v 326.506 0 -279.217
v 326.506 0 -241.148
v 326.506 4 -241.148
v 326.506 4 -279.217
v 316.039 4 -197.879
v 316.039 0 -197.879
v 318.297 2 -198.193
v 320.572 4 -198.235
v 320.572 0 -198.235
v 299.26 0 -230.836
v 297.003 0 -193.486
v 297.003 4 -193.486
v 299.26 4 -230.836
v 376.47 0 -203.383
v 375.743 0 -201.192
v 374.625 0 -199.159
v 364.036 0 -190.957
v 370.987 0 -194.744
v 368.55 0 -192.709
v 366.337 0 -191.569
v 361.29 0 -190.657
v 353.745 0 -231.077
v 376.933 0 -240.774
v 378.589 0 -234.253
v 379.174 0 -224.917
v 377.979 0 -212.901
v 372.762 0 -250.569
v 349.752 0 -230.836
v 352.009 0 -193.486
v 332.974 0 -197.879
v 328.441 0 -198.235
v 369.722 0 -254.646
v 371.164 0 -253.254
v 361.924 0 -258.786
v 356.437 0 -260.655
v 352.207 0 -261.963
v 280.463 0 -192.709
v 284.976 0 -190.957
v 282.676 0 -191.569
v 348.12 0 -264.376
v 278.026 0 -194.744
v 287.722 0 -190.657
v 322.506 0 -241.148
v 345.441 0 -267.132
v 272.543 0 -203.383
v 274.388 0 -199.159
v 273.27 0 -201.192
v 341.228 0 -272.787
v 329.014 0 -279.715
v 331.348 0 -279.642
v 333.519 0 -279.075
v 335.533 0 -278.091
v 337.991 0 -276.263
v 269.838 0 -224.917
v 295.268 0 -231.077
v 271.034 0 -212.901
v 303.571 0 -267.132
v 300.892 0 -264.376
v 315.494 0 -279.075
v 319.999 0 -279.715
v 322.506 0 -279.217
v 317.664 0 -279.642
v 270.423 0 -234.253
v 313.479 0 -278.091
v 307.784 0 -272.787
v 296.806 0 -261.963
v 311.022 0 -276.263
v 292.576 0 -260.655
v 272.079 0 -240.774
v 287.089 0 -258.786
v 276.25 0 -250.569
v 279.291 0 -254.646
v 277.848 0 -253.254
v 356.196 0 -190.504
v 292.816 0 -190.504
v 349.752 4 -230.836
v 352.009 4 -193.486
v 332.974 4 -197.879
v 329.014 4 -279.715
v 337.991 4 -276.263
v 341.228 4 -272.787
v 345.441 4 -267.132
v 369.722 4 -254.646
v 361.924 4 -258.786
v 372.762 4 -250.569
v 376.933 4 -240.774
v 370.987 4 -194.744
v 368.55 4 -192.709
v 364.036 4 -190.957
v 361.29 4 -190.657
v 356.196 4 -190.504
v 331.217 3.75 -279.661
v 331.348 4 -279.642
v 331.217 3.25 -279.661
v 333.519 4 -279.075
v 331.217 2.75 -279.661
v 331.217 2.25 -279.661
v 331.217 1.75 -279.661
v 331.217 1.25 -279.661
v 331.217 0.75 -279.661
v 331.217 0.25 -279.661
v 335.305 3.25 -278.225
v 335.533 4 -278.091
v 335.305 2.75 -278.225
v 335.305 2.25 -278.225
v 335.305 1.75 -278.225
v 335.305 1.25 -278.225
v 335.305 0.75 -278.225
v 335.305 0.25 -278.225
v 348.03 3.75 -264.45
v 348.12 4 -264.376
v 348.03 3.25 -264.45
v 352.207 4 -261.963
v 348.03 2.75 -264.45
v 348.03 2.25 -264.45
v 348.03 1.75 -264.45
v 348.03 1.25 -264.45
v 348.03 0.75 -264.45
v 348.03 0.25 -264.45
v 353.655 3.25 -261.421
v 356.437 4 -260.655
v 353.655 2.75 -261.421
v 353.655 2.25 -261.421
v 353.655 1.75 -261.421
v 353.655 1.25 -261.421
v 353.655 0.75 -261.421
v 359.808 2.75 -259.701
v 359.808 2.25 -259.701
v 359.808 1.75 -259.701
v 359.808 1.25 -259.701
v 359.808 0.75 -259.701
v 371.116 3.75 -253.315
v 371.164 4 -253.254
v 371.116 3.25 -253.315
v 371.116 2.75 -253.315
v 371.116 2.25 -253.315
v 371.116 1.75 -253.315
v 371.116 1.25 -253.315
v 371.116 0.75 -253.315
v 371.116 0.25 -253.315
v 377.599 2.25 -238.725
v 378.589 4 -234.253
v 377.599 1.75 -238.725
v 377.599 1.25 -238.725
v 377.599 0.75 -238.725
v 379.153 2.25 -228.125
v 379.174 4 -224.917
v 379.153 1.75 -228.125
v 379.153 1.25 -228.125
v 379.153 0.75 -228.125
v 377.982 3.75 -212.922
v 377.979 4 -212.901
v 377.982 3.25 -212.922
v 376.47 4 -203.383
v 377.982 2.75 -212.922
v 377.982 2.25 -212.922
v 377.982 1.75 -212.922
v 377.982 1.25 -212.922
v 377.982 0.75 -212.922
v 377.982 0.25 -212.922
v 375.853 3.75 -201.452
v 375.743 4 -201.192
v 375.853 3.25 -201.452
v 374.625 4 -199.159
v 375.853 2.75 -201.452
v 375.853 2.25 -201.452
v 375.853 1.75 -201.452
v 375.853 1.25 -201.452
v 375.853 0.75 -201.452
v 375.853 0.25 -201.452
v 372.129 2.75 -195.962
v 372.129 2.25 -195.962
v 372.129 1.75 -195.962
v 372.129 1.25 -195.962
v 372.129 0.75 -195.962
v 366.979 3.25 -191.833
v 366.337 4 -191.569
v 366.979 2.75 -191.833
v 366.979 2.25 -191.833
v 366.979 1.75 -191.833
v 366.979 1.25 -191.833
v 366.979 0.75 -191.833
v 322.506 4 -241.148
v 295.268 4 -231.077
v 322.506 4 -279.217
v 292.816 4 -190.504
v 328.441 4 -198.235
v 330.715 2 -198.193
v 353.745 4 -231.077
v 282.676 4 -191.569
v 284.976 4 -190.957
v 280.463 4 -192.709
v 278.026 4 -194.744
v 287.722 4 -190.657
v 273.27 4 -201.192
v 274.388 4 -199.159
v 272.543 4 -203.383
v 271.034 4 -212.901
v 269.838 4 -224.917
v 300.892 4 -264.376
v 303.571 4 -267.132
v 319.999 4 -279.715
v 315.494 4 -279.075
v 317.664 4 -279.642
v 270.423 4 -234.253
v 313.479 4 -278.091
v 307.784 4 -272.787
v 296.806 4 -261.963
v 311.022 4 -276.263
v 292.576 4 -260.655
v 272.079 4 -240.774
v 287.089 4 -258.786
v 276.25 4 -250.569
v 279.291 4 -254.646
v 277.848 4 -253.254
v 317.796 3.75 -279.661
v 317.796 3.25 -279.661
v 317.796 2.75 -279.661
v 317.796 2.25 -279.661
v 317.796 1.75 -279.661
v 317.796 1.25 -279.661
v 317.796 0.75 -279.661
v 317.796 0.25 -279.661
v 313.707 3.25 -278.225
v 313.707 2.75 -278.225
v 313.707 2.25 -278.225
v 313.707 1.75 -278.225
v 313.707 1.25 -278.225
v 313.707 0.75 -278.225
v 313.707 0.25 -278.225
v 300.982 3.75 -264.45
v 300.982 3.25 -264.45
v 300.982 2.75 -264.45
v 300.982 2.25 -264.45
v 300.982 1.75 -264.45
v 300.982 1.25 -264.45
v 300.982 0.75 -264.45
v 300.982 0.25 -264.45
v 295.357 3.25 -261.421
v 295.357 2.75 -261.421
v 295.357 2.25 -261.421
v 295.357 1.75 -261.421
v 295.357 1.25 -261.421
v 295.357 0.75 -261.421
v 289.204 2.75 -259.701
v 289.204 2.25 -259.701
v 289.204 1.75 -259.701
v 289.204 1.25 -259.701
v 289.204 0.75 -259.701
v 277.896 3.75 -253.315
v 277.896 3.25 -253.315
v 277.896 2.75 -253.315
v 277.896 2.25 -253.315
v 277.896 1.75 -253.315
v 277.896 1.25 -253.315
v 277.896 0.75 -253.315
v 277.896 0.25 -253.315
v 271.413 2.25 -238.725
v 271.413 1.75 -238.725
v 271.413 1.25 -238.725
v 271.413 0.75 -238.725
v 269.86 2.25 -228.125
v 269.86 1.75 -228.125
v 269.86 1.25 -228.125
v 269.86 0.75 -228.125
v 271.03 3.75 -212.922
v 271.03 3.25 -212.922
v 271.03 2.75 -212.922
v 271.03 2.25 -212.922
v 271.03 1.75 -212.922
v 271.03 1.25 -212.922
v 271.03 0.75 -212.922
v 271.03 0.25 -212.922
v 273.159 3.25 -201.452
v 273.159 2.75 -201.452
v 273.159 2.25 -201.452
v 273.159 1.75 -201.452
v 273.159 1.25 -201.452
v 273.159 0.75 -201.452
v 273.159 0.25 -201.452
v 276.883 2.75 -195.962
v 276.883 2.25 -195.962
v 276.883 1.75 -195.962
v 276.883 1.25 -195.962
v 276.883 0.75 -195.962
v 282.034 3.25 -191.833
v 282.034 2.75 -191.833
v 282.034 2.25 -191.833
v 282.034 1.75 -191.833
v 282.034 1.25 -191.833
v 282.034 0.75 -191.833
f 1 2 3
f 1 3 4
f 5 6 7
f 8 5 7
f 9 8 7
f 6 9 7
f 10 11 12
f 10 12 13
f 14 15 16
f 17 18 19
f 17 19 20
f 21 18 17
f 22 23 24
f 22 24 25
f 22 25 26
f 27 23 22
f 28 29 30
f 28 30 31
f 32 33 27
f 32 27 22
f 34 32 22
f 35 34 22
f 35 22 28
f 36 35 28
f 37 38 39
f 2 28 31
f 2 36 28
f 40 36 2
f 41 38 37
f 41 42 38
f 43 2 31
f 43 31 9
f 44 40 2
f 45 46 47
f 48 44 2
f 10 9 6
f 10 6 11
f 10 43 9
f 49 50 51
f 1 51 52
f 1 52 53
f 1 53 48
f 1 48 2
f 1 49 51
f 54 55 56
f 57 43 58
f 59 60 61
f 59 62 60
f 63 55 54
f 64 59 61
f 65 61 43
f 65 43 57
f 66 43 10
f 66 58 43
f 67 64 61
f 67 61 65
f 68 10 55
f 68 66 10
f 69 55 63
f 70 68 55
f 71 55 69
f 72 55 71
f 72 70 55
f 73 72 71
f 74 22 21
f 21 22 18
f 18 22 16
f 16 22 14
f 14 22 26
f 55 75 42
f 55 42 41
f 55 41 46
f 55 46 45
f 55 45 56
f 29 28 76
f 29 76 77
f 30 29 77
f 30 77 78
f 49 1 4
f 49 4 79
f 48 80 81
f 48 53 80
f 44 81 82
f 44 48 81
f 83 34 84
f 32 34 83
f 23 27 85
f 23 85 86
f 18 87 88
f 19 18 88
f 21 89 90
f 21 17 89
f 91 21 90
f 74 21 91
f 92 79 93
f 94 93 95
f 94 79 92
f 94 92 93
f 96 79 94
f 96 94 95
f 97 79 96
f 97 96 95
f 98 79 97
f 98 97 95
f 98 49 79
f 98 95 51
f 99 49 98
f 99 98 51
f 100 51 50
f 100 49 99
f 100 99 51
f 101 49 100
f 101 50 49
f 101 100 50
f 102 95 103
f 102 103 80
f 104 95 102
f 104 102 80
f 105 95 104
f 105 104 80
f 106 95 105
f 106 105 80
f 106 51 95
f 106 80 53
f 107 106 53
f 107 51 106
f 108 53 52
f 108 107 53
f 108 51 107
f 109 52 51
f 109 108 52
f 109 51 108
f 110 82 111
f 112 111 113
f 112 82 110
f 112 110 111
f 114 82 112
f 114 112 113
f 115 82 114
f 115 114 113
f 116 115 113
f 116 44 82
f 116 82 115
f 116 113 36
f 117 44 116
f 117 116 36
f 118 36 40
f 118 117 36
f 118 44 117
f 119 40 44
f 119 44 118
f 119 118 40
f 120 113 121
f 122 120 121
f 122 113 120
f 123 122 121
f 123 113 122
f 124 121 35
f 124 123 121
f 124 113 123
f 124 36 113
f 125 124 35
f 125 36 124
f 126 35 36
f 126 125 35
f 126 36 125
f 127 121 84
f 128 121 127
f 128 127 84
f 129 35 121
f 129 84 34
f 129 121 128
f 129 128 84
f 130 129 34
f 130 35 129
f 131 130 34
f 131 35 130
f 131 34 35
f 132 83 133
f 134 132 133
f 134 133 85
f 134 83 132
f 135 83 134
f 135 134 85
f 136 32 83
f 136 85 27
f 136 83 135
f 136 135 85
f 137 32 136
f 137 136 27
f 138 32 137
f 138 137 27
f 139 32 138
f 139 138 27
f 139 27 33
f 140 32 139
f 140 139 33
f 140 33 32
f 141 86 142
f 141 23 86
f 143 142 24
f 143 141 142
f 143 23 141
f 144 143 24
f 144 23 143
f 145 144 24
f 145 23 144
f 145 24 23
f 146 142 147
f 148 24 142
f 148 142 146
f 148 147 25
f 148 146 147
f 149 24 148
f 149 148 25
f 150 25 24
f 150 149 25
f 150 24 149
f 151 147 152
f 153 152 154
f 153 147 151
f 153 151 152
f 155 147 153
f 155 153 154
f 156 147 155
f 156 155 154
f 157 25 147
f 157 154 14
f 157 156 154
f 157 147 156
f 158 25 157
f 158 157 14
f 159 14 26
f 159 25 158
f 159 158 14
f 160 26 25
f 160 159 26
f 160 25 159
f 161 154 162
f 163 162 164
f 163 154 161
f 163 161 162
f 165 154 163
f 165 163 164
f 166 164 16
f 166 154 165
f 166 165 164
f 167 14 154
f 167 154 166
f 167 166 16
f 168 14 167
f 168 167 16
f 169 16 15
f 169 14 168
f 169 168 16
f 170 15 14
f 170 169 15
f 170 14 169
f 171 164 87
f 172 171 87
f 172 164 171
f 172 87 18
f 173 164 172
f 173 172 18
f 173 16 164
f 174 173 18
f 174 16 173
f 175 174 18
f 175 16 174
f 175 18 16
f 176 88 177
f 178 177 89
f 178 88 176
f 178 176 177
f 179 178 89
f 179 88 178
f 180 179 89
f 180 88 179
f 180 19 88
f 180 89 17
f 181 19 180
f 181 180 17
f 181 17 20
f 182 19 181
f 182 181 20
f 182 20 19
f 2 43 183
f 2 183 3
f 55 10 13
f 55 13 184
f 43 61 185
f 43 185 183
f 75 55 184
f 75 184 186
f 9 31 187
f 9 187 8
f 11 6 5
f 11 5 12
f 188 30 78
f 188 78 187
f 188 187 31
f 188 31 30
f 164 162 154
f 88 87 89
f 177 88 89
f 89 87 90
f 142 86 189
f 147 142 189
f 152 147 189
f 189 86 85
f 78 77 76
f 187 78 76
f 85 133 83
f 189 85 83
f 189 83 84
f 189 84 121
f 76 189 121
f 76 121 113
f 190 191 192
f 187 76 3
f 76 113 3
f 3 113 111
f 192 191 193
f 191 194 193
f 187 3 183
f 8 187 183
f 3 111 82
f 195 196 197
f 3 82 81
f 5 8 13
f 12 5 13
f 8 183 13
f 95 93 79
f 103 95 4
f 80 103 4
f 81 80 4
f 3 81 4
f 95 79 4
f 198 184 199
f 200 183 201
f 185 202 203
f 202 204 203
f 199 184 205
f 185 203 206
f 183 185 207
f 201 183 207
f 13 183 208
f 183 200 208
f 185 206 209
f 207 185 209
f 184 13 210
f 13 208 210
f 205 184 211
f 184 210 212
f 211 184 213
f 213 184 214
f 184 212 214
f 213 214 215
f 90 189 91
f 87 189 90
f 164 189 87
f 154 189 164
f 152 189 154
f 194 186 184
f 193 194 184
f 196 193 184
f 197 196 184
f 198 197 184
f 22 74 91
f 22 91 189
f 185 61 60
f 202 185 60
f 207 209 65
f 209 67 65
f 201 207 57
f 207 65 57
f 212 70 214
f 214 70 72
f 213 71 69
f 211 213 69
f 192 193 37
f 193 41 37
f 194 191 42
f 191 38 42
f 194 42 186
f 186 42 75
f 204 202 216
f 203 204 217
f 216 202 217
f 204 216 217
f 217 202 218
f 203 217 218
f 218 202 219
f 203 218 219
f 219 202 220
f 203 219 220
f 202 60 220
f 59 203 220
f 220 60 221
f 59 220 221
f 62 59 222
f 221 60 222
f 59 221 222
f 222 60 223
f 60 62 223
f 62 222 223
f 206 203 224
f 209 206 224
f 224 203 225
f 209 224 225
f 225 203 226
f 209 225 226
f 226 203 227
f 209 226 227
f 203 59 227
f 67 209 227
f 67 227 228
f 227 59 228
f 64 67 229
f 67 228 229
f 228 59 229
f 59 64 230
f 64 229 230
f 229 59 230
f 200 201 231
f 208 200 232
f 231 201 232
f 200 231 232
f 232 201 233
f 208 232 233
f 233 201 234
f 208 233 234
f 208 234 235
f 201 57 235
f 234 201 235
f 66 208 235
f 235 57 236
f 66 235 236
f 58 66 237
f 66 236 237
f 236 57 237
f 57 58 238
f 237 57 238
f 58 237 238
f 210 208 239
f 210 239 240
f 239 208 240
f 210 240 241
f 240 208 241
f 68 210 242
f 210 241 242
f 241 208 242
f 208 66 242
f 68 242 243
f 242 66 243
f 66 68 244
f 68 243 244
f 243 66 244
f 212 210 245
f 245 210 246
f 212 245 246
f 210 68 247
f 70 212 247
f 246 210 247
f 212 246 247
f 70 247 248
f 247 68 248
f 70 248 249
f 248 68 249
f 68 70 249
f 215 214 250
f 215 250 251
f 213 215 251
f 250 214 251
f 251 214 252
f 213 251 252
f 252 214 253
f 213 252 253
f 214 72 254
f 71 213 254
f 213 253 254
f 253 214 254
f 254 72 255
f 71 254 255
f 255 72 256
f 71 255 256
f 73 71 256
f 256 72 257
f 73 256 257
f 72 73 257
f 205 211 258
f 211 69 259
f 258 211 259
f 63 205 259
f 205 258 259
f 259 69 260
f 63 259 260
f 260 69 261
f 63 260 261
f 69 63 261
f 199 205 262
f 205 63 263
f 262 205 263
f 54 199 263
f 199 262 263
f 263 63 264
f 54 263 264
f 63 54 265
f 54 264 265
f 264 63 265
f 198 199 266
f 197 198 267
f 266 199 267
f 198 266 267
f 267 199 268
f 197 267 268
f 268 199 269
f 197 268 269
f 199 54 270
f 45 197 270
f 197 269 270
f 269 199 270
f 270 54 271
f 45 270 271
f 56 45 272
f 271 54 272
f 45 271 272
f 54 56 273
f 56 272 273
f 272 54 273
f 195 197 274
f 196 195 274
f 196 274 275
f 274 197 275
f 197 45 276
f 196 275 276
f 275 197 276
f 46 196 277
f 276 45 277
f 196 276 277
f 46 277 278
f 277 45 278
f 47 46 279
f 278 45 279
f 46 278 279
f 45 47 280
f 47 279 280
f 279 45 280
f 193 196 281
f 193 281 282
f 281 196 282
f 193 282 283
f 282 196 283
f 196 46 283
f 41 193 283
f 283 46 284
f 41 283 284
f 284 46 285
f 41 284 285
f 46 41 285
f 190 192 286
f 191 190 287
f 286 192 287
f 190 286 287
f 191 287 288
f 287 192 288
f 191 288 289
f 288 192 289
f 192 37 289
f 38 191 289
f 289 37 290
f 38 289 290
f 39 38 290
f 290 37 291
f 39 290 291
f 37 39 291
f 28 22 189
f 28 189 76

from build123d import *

# Parameters (mm, degrees)
EXTRUDE_1_DEPTH = 4


with BuildPart() as part:
    # Эскиз1 → Бобышка-Вытянуть1 (new body)
    with BuildSketch(Plane(origin=(0, 0, 0), x_dir=(1, 0, 0), z_dir=(0, 1, 0))):
        with BuildLine():
            Line((322.506185164, 279.216996549), (322.506185164, 241.148279103))
            Line((322.506185164, 241.148279103), (326.506185164, 241.148279103))
            Line((326.506185164, 241.148279103), (326.506185164, 279.216996549))
            add(Edge.make_bspline(
                [(326.506185164, 279.216996549), (333.228337001, 281.311766086), (340.78265111, 274.499419386), (346.685136371, 264.616389153), (353.60679963, 261.075530259), (360.44019493, 259.998183265), (365.414819015, 256.712650418), (371.264337857, 254.266266236), (374.150175863, 247.227227303), (378.146468371, 238.886306312), (379.671432599, 226.577719389), (378.696591797, 216.620970327), (377.0562995, 207.840217504), (376.707695621, 201.864992605), (372.502800727, 196.127844551), (367.871454499, 191.472787985), (361.618584455, 190.510159582), (357.86512227, 190.604513312), (356.196418644, 190.503683274)],
                knots=[0, 0, 0, 0, 0.136915078, 0.211026498, 0.260495211, 0.308388453, 0.367334171, 0.39572498, 0.449167004, 0.529310598, 0.610954999, 0.727155916, 0.756820744, 0.816073262, 0.859025792, 0.916880577, 0.959528089, 1, 1, 1, 1], degree=3))
            Line((356.196418644, 190.503683274), (353.744795566, 231.077230675))
            Line((353.744795566, 231.077230675), (349.752077793, 230.835974003))
            Line((349.752077793, 230.835974003), (352.008890416, 193.486474909))
            Line((352.008890416, 193.486474909), (332.973780039, 197.87949925))
            add(Edge.make_bspline(
                [(332.973780039, 197.87949925), (330.723503611, 198.328988408), (328.44070128, 198.235143432)],
                knots=[0, 0, 0, 1, 1, 1], degree=2))
            Line((328.44070128, 198.235143432), (324.506185164, 198.235143432))
            Line((324.506185164, 198.235143432), (320.571669047, 198.235143432))
            add(Edge.make_bspline(
                [(316.038590288, 197.87949925), (318.288866716, 198.328988408), (320.571669047, 198.235143432)],
                knots=[0, 0, 0, 1, 1, 1], degree=2))
            Line((316.038590288, 197.87949925), (297.003479911, 193.486474909))
            Line((297.003479911, 193.486474909), (299.260292534, 230.835974003))
            Line((299.260292534, 230.835974003), (295.267574761, 231.077230675))
            Line((295.267574761, 231.077230675), (292.815951683, 190.503683274))
            add(Edge.make_bspline(
                [(322.506185164, 279.216996549), (315.784033326, 281.311766086), (308.229719217, 274.499419386), (302.327233956, 264.616389153), (295.405570697, 261.075530259), (288.572175397, 259.998183265), (283.597551312, 256.712650418), (277.74803247, 254.266266236), (274.862194464, 247.227227303), (270.865901956, 238.886306312), (269.340937728, 226.577719389), (270.31577853, 216.620970327), (271.956070827, 207.840217504), (272.304674706, 201.864992605), (276.5095696, 196.127844551), (281.140915828, 191.472787985), (287.393785872, 190.510159582), (291.147248057, 190.604513312), (292.815951683, 190.503683274)],
                knots=[0, 0, 0, 0, 0.136915078, 0.211026498, 0.260495211, 0.308388453, 0.367334171, 0.39572498, 0.449167004, 0.529310598, 0.610954999, 0.727155916, 0.756820744, 0.816073262, 0.859025792, 0.916880577, 0.959528089, 1, 1, 1, 1], degree=3))
        make_face()
    extrude(amount=EXTRUDE_1_DEPTH)


solid = part.part
